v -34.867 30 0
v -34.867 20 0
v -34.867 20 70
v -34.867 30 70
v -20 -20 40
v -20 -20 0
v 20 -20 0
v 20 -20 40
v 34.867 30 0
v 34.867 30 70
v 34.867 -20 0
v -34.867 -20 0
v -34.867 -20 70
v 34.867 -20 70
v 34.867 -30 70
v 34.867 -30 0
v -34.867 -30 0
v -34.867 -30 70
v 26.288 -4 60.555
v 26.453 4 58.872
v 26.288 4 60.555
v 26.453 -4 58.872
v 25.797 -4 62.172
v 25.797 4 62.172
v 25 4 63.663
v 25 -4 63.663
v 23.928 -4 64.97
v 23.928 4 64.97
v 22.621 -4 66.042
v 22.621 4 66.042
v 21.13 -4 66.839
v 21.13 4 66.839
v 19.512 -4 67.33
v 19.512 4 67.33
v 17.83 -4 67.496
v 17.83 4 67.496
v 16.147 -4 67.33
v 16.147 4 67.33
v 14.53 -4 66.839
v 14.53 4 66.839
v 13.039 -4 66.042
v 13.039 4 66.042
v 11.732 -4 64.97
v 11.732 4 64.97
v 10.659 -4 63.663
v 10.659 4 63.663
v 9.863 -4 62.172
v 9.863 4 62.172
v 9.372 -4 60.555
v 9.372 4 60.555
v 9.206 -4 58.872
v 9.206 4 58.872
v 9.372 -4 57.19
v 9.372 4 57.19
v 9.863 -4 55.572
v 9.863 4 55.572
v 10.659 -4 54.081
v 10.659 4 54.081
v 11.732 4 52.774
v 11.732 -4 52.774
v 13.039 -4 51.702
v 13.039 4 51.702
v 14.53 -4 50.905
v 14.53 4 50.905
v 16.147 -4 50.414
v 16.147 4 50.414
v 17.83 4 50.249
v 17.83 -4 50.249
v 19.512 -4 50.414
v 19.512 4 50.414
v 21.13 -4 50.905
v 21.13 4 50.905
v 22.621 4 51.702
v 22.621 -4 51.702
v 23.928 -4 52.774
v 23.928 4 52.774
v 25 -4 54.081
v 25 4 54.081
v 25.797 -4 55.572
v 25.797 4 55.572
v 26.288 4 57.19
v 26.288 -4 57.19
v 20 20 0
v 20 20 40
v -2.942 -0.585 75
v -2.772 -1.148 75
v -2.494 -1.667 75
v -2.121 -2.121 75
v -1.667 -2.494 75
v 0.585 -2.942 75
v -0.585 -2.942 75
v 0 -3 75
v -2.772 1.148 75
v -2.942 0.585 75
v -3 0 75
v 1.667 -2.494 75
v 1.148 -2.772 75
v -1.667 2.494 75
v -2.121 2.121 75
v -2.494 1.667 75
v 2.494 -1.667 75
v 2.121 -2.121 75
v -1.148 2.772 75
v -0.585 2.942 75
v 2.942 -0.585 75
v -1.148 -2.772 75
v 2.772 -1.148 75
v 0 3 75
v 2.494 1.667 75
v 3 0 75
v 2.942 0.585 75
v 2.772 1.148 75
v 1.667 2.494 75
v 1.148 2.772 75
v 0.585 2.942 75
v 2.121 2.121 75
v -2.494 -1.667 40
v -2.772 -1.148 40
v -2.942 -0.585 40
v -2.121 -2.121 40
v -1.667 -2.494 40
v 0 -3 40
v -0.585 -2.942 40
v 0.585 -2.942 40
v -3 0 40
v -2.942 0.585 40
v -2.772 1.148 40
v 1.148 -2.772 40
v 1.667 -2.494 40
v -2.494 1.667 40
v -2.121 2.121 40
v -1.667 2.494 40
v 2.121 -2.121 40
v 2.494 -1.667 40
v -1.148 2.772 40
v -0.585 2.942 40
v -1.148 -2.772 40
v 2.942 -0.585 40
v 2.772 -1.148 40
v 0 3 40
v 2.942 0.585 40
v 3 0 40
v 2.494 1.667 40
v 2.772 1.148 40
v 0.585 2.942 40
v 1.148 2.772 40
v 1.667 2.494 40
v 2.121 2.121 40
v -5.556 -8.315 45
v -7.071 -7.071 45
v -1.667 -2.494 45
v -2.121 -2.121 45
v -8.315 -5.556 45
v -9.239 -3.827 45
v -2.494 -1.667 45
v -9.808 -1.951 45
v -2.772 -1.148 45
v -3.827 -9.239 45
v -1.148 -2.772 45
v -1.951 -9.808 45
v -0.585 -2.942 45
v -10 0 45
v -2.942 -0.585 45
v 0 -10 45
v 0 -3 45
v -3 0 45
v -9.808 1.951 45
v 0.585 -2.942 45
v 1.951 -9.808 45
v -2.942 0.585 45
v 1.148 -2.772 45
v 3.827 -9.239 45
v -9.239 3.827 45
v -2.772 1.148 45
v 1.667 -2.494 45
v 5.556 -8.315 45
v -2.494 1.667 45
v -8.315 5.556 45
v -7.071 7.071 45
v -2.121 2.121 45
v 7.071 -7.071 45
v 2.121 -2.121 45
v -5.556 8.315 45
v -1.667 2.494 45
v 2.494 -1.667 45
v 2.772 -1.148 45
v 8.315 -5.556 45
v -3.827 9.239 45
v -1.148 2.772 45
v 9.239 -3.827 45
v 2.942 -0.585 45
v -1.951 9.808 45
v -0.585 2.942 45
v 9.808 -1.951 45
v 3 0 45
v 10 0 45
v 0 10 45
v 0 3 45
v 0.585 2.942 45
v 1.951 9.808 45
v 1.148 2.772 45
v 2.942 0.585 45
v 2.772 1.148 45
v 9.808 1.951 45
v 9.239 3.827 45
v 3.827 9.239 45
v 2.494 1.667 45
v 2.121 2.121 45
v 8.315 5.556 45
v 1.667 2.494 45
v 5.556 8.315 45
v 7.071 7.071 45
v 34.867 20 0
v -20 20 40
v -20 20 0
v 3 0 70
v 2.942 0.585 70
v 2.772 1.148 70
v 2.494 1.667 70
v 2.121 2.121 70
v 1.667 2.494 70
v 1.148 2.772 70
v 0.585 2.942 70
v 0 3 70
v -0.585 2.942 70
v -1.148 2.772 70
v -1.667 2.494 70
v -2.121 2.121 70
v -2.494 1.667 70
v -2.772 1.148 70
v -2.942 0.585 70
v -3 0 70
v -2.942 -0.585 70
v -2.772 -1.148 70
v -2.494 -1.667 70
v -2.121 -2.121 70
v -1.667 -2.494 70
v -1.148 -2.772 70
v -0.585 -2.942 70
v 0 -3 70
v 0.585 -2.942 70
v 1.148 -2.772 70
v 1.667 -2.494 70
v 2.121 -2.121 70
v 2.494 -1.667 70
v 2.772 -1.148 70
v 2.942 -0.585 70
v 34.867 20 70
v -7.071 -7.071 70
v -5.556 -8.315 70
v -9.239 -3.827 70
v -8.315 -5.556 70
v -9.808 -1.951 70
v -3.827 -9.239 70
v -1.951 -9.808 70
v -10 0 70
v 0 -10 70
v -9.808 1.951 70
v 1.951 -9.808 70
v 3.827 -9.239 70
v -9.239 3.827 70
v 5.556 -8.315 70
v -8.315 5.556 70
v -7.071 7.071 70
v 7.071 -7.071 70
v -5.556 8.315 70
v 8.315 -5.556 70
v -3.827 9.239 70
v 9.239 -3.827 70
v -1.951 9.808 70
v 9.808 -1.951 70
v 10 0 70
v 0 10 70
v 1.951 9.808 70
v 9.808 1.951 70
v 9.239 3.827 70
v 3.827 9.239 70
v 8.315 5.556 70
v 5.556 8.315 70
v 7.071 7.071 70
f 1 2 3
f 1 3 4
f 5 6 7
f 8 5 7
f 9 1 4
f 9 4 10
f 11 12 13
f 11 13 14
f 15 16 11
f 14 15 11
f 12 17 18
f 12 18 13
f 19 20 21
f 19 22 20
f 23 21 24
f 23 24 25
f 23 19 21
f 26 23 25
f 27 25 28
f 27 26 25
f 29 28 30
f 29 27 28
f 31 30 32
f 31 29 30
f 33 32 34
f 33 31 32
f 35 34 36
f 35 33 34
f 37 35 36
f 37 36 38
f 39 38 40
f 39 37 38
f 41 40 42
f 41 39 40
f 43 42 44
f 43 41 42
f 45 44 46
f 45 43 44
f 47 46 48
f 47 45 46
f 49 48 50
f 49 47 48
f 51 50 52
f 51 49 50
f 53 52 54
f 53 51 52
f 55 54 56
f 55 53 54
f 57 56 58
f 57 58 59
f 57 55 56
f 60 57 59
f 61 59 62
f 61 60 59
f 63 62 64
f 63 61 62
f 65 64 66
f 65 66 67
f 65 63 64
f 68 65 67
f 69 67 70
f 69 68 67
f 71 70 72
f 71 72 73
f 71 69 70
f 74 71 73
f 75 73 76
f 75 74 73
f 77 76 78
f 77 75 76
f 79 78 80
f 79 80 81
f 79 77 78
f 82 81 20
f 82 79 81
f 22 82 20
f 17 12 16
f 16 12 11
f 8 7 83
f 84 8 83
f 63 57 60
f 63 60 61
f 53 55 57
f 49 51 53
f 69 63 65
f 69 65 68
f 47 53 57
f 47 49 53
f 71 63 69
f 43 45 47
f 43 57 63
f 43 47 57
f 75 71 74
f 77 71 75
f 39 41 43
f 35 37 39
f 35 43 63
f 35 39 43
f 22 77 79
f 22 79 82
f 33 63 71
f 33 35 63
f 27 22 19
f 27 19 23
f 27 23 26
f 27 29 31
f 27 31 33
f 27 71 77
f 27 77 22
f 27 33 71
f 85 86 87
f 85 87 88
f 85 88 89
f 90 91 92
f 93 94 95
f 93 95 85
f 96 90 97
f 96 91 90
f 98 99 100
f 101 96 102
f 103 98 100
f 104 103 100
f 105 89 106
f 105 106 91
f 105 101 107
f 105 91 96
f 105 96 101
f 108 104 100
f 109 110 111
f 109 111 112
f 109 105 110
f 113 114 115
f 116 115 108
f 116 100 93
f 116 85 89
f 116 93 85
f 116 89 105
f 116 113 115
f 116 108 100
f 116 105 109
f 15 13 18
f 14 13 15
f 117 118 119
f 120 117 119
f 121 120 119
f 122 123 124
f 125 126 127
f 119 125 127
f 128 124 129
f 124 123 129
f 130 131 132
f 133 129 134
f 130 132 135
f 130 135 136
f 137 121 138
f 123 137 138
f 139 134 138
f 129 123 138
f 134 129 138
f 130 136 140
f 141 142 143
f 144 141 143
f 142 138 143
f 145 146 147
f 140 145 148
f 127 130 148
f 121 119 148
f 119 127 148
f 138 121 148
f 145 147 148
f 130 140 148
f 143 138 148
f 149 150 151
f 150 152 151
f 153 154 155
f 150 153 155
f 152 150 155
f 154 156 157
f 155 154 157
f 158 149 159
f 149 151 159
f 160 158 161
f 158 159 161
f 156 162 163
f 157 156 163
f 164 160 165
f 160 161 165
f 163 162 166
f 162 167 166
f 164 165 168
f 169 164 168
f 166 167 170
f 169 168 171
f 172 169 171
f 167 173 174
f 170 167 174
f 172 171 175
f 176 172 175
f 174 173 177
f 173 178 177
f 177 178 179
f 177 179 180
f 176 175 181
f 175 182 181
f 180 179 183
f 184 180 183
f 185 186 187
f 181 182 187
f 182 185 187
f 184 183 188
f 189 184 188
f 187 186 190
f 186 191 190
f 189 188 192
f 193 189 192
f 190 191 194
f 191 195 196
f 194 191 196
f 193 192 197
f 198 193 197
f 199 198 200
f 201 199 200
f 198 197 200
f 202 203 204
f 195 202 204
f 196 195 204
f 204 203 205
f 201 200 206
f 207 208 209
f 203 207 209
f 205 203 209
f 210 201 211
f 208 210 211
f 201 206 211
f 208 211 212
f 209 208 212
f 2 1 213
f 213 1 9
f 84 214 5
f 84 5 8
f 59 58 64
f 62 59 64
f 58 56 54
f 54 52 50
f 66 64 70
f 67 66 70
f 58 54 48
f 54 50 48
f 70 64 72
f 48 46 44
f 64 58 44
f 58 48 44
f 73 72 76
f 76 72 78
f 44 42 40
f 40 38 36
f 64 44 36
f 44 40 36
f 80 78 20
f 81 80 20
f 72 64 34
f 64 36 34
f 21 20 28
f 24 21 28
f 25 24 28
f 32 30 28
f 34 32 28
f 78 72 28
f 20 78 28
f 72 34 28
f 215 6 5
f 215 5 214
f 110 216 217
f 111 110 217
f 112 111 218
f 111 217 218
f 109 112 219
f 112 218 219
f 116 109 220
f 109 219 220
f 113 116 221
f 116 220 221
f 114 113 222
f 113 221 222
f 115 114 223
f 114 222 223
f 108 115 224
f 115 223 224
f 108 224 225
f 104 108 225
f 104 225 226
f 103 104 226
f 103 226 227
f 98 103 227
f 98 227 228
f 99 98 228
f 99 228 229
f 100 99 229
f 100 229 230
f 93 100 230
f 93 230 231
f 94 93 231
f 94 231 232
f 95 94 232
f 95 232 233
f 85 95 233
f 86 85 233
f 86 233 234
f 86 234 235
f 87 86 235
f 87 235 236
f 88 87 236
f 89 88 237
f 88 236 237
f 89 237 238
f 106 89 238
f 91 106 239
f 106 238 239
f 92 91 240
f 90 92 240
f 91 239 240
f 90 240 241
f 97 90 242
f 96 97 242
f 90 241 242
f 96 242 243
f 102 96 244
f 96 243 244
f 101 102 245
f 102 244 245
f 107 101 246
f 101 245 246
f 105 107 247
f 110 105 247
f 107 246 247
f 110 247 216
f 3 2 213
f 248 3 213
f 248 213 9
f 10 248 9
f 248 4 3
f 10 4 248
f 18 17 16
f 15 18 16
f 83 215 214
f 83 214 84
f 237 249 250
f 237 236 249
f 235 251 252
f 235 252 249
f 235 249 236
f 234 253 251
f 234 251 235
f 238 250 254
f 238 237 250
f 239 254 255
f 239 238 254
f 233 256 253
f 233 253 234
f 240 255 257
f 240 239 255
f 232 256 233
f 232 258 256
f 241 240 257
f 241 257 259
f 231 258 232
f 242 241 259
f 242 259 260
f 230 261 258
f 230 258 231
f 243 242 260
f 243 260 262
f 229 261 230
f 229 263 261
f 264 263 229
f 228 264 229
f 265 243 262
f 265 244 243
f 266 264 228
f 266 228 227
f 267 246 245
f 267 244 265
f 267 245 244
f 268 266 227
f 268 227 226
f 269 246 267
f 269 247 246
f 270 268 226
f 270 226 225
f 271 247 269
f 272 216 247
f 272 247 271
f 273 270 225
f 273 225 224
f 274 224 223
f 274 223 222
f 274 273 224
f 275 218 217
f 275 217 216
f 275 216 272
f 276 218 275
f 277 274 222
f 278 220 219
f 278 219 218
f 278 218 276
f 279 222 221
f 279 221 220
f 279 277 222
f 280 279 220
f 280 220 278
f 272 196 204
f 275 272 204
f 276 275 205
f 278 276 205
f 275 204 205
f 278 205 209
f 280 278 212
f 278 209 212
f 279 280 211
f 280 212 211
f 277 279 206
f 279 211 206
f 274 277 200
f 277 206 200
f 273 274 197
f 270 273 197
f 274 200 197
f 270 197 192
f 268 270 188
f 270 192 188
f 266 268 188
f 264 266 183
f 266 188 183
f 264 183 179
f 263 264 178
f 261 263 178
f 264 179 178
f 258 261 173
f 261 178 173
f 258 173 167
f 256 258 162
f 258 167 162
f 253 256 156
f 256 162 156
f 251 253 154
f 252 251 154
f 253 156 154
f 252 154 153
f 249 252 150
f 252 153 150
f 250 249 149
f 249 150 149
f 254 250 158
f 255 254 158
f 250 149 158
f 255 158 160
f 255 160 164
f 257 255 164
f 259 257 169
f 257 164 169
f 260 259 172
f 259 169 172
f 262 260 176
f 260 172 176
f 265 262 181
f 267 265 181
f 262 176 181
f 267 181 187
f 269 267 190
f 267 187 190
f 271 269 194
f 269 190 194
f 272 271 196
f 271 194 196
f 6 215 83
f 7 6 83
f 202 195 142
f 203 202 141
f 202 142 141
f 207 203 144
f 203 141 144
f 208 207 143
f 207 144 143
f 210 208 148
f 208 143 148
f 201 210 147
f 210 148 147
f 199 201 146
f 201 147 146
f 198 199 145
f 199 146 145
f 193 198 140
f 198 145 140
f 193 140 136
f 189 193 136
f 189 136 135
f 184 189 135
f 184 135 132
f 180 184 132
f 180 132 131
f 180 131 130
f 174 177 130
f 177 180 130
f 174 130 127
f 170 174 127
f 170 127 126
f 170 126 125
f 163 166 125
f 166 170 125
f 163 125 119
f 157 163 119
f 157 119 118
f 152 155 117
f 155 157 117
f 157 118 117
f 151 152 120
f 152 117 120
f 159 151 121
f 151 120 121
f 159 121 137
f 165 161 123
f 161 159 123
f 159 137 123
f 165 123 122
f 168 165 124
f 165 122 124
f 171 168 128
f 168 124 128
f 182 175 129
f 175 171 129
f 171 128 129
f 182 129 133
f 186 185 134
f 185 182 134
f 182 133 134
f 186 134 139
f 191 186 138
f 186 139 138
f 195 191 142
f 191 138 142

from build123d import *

# Parameters (mm, degrees)
F0_W      = 40
F0_H      = 40
F1_DEPTH  = 40
F2_R      = 3
F3_DEPTH  = 35
F5_R      = 10
F6_DEPTH  = 25
F7_R      = 8.6236634439
F8_DEPTH  = 4
F9_W      = 69.7338283062
F9_H      = 10
F10_DEPTH = 70


# Not quite as in the source:
# - the program builds the solid bodies; features that only make, move or delete a surface that nothing else refers to are left out


with BuildPart() as f1:
    # F0 (on Top) → F1 (new body)
    with BuildSketch(Plane.XY):
        Rectangle(F0_W, F0_H)
    extrude(amount=F1_DEPTH)


with BuildPart() as f3:
    # F2 (on face) → F3 (new body)
    with BuildSketch(Plane.XY.offset(40)):
        Circle(F2_R)
    extrude(amount=F3_DEPTH)

    # F5 (on offset) → F6 (join)
    with BuildSketch(Plane.XY.offset(45)):
        Circle(F5_R)
    extrude(amount=F6_DEPTH)


with BuildPart() as f8:
    # F7 (on Front) → F8 (new body, symmetric)
    with BuildSketch(Plane.XZ):
        with Locations((17.8297422826, 58.8721744716)):
            Circle(F7_R)
    extrude(amount=F8_DEPTH, both=True)


with BuildPart() as f10:
    # F9 (on Top) → F10 (new body)
    with BuildSketch(Plane.XY):
        with Locations((0, 25)):
            Rectangle(F9_W, F9_H)
    extrude(amount=F10_DEPTH)


with BuildPart() as f10b:
    # F9 (on Top) → F10, piece 2 (new body)
    with BuildSketch(Plane.XY):
        with Locations((0, -25)):
            Rectangle(F9_W, F9_H)
    extrude(amount=F10_DEPTH)


solid = Compound([f1.part, f3.part, f8.part, f10.part, f10b.part])
